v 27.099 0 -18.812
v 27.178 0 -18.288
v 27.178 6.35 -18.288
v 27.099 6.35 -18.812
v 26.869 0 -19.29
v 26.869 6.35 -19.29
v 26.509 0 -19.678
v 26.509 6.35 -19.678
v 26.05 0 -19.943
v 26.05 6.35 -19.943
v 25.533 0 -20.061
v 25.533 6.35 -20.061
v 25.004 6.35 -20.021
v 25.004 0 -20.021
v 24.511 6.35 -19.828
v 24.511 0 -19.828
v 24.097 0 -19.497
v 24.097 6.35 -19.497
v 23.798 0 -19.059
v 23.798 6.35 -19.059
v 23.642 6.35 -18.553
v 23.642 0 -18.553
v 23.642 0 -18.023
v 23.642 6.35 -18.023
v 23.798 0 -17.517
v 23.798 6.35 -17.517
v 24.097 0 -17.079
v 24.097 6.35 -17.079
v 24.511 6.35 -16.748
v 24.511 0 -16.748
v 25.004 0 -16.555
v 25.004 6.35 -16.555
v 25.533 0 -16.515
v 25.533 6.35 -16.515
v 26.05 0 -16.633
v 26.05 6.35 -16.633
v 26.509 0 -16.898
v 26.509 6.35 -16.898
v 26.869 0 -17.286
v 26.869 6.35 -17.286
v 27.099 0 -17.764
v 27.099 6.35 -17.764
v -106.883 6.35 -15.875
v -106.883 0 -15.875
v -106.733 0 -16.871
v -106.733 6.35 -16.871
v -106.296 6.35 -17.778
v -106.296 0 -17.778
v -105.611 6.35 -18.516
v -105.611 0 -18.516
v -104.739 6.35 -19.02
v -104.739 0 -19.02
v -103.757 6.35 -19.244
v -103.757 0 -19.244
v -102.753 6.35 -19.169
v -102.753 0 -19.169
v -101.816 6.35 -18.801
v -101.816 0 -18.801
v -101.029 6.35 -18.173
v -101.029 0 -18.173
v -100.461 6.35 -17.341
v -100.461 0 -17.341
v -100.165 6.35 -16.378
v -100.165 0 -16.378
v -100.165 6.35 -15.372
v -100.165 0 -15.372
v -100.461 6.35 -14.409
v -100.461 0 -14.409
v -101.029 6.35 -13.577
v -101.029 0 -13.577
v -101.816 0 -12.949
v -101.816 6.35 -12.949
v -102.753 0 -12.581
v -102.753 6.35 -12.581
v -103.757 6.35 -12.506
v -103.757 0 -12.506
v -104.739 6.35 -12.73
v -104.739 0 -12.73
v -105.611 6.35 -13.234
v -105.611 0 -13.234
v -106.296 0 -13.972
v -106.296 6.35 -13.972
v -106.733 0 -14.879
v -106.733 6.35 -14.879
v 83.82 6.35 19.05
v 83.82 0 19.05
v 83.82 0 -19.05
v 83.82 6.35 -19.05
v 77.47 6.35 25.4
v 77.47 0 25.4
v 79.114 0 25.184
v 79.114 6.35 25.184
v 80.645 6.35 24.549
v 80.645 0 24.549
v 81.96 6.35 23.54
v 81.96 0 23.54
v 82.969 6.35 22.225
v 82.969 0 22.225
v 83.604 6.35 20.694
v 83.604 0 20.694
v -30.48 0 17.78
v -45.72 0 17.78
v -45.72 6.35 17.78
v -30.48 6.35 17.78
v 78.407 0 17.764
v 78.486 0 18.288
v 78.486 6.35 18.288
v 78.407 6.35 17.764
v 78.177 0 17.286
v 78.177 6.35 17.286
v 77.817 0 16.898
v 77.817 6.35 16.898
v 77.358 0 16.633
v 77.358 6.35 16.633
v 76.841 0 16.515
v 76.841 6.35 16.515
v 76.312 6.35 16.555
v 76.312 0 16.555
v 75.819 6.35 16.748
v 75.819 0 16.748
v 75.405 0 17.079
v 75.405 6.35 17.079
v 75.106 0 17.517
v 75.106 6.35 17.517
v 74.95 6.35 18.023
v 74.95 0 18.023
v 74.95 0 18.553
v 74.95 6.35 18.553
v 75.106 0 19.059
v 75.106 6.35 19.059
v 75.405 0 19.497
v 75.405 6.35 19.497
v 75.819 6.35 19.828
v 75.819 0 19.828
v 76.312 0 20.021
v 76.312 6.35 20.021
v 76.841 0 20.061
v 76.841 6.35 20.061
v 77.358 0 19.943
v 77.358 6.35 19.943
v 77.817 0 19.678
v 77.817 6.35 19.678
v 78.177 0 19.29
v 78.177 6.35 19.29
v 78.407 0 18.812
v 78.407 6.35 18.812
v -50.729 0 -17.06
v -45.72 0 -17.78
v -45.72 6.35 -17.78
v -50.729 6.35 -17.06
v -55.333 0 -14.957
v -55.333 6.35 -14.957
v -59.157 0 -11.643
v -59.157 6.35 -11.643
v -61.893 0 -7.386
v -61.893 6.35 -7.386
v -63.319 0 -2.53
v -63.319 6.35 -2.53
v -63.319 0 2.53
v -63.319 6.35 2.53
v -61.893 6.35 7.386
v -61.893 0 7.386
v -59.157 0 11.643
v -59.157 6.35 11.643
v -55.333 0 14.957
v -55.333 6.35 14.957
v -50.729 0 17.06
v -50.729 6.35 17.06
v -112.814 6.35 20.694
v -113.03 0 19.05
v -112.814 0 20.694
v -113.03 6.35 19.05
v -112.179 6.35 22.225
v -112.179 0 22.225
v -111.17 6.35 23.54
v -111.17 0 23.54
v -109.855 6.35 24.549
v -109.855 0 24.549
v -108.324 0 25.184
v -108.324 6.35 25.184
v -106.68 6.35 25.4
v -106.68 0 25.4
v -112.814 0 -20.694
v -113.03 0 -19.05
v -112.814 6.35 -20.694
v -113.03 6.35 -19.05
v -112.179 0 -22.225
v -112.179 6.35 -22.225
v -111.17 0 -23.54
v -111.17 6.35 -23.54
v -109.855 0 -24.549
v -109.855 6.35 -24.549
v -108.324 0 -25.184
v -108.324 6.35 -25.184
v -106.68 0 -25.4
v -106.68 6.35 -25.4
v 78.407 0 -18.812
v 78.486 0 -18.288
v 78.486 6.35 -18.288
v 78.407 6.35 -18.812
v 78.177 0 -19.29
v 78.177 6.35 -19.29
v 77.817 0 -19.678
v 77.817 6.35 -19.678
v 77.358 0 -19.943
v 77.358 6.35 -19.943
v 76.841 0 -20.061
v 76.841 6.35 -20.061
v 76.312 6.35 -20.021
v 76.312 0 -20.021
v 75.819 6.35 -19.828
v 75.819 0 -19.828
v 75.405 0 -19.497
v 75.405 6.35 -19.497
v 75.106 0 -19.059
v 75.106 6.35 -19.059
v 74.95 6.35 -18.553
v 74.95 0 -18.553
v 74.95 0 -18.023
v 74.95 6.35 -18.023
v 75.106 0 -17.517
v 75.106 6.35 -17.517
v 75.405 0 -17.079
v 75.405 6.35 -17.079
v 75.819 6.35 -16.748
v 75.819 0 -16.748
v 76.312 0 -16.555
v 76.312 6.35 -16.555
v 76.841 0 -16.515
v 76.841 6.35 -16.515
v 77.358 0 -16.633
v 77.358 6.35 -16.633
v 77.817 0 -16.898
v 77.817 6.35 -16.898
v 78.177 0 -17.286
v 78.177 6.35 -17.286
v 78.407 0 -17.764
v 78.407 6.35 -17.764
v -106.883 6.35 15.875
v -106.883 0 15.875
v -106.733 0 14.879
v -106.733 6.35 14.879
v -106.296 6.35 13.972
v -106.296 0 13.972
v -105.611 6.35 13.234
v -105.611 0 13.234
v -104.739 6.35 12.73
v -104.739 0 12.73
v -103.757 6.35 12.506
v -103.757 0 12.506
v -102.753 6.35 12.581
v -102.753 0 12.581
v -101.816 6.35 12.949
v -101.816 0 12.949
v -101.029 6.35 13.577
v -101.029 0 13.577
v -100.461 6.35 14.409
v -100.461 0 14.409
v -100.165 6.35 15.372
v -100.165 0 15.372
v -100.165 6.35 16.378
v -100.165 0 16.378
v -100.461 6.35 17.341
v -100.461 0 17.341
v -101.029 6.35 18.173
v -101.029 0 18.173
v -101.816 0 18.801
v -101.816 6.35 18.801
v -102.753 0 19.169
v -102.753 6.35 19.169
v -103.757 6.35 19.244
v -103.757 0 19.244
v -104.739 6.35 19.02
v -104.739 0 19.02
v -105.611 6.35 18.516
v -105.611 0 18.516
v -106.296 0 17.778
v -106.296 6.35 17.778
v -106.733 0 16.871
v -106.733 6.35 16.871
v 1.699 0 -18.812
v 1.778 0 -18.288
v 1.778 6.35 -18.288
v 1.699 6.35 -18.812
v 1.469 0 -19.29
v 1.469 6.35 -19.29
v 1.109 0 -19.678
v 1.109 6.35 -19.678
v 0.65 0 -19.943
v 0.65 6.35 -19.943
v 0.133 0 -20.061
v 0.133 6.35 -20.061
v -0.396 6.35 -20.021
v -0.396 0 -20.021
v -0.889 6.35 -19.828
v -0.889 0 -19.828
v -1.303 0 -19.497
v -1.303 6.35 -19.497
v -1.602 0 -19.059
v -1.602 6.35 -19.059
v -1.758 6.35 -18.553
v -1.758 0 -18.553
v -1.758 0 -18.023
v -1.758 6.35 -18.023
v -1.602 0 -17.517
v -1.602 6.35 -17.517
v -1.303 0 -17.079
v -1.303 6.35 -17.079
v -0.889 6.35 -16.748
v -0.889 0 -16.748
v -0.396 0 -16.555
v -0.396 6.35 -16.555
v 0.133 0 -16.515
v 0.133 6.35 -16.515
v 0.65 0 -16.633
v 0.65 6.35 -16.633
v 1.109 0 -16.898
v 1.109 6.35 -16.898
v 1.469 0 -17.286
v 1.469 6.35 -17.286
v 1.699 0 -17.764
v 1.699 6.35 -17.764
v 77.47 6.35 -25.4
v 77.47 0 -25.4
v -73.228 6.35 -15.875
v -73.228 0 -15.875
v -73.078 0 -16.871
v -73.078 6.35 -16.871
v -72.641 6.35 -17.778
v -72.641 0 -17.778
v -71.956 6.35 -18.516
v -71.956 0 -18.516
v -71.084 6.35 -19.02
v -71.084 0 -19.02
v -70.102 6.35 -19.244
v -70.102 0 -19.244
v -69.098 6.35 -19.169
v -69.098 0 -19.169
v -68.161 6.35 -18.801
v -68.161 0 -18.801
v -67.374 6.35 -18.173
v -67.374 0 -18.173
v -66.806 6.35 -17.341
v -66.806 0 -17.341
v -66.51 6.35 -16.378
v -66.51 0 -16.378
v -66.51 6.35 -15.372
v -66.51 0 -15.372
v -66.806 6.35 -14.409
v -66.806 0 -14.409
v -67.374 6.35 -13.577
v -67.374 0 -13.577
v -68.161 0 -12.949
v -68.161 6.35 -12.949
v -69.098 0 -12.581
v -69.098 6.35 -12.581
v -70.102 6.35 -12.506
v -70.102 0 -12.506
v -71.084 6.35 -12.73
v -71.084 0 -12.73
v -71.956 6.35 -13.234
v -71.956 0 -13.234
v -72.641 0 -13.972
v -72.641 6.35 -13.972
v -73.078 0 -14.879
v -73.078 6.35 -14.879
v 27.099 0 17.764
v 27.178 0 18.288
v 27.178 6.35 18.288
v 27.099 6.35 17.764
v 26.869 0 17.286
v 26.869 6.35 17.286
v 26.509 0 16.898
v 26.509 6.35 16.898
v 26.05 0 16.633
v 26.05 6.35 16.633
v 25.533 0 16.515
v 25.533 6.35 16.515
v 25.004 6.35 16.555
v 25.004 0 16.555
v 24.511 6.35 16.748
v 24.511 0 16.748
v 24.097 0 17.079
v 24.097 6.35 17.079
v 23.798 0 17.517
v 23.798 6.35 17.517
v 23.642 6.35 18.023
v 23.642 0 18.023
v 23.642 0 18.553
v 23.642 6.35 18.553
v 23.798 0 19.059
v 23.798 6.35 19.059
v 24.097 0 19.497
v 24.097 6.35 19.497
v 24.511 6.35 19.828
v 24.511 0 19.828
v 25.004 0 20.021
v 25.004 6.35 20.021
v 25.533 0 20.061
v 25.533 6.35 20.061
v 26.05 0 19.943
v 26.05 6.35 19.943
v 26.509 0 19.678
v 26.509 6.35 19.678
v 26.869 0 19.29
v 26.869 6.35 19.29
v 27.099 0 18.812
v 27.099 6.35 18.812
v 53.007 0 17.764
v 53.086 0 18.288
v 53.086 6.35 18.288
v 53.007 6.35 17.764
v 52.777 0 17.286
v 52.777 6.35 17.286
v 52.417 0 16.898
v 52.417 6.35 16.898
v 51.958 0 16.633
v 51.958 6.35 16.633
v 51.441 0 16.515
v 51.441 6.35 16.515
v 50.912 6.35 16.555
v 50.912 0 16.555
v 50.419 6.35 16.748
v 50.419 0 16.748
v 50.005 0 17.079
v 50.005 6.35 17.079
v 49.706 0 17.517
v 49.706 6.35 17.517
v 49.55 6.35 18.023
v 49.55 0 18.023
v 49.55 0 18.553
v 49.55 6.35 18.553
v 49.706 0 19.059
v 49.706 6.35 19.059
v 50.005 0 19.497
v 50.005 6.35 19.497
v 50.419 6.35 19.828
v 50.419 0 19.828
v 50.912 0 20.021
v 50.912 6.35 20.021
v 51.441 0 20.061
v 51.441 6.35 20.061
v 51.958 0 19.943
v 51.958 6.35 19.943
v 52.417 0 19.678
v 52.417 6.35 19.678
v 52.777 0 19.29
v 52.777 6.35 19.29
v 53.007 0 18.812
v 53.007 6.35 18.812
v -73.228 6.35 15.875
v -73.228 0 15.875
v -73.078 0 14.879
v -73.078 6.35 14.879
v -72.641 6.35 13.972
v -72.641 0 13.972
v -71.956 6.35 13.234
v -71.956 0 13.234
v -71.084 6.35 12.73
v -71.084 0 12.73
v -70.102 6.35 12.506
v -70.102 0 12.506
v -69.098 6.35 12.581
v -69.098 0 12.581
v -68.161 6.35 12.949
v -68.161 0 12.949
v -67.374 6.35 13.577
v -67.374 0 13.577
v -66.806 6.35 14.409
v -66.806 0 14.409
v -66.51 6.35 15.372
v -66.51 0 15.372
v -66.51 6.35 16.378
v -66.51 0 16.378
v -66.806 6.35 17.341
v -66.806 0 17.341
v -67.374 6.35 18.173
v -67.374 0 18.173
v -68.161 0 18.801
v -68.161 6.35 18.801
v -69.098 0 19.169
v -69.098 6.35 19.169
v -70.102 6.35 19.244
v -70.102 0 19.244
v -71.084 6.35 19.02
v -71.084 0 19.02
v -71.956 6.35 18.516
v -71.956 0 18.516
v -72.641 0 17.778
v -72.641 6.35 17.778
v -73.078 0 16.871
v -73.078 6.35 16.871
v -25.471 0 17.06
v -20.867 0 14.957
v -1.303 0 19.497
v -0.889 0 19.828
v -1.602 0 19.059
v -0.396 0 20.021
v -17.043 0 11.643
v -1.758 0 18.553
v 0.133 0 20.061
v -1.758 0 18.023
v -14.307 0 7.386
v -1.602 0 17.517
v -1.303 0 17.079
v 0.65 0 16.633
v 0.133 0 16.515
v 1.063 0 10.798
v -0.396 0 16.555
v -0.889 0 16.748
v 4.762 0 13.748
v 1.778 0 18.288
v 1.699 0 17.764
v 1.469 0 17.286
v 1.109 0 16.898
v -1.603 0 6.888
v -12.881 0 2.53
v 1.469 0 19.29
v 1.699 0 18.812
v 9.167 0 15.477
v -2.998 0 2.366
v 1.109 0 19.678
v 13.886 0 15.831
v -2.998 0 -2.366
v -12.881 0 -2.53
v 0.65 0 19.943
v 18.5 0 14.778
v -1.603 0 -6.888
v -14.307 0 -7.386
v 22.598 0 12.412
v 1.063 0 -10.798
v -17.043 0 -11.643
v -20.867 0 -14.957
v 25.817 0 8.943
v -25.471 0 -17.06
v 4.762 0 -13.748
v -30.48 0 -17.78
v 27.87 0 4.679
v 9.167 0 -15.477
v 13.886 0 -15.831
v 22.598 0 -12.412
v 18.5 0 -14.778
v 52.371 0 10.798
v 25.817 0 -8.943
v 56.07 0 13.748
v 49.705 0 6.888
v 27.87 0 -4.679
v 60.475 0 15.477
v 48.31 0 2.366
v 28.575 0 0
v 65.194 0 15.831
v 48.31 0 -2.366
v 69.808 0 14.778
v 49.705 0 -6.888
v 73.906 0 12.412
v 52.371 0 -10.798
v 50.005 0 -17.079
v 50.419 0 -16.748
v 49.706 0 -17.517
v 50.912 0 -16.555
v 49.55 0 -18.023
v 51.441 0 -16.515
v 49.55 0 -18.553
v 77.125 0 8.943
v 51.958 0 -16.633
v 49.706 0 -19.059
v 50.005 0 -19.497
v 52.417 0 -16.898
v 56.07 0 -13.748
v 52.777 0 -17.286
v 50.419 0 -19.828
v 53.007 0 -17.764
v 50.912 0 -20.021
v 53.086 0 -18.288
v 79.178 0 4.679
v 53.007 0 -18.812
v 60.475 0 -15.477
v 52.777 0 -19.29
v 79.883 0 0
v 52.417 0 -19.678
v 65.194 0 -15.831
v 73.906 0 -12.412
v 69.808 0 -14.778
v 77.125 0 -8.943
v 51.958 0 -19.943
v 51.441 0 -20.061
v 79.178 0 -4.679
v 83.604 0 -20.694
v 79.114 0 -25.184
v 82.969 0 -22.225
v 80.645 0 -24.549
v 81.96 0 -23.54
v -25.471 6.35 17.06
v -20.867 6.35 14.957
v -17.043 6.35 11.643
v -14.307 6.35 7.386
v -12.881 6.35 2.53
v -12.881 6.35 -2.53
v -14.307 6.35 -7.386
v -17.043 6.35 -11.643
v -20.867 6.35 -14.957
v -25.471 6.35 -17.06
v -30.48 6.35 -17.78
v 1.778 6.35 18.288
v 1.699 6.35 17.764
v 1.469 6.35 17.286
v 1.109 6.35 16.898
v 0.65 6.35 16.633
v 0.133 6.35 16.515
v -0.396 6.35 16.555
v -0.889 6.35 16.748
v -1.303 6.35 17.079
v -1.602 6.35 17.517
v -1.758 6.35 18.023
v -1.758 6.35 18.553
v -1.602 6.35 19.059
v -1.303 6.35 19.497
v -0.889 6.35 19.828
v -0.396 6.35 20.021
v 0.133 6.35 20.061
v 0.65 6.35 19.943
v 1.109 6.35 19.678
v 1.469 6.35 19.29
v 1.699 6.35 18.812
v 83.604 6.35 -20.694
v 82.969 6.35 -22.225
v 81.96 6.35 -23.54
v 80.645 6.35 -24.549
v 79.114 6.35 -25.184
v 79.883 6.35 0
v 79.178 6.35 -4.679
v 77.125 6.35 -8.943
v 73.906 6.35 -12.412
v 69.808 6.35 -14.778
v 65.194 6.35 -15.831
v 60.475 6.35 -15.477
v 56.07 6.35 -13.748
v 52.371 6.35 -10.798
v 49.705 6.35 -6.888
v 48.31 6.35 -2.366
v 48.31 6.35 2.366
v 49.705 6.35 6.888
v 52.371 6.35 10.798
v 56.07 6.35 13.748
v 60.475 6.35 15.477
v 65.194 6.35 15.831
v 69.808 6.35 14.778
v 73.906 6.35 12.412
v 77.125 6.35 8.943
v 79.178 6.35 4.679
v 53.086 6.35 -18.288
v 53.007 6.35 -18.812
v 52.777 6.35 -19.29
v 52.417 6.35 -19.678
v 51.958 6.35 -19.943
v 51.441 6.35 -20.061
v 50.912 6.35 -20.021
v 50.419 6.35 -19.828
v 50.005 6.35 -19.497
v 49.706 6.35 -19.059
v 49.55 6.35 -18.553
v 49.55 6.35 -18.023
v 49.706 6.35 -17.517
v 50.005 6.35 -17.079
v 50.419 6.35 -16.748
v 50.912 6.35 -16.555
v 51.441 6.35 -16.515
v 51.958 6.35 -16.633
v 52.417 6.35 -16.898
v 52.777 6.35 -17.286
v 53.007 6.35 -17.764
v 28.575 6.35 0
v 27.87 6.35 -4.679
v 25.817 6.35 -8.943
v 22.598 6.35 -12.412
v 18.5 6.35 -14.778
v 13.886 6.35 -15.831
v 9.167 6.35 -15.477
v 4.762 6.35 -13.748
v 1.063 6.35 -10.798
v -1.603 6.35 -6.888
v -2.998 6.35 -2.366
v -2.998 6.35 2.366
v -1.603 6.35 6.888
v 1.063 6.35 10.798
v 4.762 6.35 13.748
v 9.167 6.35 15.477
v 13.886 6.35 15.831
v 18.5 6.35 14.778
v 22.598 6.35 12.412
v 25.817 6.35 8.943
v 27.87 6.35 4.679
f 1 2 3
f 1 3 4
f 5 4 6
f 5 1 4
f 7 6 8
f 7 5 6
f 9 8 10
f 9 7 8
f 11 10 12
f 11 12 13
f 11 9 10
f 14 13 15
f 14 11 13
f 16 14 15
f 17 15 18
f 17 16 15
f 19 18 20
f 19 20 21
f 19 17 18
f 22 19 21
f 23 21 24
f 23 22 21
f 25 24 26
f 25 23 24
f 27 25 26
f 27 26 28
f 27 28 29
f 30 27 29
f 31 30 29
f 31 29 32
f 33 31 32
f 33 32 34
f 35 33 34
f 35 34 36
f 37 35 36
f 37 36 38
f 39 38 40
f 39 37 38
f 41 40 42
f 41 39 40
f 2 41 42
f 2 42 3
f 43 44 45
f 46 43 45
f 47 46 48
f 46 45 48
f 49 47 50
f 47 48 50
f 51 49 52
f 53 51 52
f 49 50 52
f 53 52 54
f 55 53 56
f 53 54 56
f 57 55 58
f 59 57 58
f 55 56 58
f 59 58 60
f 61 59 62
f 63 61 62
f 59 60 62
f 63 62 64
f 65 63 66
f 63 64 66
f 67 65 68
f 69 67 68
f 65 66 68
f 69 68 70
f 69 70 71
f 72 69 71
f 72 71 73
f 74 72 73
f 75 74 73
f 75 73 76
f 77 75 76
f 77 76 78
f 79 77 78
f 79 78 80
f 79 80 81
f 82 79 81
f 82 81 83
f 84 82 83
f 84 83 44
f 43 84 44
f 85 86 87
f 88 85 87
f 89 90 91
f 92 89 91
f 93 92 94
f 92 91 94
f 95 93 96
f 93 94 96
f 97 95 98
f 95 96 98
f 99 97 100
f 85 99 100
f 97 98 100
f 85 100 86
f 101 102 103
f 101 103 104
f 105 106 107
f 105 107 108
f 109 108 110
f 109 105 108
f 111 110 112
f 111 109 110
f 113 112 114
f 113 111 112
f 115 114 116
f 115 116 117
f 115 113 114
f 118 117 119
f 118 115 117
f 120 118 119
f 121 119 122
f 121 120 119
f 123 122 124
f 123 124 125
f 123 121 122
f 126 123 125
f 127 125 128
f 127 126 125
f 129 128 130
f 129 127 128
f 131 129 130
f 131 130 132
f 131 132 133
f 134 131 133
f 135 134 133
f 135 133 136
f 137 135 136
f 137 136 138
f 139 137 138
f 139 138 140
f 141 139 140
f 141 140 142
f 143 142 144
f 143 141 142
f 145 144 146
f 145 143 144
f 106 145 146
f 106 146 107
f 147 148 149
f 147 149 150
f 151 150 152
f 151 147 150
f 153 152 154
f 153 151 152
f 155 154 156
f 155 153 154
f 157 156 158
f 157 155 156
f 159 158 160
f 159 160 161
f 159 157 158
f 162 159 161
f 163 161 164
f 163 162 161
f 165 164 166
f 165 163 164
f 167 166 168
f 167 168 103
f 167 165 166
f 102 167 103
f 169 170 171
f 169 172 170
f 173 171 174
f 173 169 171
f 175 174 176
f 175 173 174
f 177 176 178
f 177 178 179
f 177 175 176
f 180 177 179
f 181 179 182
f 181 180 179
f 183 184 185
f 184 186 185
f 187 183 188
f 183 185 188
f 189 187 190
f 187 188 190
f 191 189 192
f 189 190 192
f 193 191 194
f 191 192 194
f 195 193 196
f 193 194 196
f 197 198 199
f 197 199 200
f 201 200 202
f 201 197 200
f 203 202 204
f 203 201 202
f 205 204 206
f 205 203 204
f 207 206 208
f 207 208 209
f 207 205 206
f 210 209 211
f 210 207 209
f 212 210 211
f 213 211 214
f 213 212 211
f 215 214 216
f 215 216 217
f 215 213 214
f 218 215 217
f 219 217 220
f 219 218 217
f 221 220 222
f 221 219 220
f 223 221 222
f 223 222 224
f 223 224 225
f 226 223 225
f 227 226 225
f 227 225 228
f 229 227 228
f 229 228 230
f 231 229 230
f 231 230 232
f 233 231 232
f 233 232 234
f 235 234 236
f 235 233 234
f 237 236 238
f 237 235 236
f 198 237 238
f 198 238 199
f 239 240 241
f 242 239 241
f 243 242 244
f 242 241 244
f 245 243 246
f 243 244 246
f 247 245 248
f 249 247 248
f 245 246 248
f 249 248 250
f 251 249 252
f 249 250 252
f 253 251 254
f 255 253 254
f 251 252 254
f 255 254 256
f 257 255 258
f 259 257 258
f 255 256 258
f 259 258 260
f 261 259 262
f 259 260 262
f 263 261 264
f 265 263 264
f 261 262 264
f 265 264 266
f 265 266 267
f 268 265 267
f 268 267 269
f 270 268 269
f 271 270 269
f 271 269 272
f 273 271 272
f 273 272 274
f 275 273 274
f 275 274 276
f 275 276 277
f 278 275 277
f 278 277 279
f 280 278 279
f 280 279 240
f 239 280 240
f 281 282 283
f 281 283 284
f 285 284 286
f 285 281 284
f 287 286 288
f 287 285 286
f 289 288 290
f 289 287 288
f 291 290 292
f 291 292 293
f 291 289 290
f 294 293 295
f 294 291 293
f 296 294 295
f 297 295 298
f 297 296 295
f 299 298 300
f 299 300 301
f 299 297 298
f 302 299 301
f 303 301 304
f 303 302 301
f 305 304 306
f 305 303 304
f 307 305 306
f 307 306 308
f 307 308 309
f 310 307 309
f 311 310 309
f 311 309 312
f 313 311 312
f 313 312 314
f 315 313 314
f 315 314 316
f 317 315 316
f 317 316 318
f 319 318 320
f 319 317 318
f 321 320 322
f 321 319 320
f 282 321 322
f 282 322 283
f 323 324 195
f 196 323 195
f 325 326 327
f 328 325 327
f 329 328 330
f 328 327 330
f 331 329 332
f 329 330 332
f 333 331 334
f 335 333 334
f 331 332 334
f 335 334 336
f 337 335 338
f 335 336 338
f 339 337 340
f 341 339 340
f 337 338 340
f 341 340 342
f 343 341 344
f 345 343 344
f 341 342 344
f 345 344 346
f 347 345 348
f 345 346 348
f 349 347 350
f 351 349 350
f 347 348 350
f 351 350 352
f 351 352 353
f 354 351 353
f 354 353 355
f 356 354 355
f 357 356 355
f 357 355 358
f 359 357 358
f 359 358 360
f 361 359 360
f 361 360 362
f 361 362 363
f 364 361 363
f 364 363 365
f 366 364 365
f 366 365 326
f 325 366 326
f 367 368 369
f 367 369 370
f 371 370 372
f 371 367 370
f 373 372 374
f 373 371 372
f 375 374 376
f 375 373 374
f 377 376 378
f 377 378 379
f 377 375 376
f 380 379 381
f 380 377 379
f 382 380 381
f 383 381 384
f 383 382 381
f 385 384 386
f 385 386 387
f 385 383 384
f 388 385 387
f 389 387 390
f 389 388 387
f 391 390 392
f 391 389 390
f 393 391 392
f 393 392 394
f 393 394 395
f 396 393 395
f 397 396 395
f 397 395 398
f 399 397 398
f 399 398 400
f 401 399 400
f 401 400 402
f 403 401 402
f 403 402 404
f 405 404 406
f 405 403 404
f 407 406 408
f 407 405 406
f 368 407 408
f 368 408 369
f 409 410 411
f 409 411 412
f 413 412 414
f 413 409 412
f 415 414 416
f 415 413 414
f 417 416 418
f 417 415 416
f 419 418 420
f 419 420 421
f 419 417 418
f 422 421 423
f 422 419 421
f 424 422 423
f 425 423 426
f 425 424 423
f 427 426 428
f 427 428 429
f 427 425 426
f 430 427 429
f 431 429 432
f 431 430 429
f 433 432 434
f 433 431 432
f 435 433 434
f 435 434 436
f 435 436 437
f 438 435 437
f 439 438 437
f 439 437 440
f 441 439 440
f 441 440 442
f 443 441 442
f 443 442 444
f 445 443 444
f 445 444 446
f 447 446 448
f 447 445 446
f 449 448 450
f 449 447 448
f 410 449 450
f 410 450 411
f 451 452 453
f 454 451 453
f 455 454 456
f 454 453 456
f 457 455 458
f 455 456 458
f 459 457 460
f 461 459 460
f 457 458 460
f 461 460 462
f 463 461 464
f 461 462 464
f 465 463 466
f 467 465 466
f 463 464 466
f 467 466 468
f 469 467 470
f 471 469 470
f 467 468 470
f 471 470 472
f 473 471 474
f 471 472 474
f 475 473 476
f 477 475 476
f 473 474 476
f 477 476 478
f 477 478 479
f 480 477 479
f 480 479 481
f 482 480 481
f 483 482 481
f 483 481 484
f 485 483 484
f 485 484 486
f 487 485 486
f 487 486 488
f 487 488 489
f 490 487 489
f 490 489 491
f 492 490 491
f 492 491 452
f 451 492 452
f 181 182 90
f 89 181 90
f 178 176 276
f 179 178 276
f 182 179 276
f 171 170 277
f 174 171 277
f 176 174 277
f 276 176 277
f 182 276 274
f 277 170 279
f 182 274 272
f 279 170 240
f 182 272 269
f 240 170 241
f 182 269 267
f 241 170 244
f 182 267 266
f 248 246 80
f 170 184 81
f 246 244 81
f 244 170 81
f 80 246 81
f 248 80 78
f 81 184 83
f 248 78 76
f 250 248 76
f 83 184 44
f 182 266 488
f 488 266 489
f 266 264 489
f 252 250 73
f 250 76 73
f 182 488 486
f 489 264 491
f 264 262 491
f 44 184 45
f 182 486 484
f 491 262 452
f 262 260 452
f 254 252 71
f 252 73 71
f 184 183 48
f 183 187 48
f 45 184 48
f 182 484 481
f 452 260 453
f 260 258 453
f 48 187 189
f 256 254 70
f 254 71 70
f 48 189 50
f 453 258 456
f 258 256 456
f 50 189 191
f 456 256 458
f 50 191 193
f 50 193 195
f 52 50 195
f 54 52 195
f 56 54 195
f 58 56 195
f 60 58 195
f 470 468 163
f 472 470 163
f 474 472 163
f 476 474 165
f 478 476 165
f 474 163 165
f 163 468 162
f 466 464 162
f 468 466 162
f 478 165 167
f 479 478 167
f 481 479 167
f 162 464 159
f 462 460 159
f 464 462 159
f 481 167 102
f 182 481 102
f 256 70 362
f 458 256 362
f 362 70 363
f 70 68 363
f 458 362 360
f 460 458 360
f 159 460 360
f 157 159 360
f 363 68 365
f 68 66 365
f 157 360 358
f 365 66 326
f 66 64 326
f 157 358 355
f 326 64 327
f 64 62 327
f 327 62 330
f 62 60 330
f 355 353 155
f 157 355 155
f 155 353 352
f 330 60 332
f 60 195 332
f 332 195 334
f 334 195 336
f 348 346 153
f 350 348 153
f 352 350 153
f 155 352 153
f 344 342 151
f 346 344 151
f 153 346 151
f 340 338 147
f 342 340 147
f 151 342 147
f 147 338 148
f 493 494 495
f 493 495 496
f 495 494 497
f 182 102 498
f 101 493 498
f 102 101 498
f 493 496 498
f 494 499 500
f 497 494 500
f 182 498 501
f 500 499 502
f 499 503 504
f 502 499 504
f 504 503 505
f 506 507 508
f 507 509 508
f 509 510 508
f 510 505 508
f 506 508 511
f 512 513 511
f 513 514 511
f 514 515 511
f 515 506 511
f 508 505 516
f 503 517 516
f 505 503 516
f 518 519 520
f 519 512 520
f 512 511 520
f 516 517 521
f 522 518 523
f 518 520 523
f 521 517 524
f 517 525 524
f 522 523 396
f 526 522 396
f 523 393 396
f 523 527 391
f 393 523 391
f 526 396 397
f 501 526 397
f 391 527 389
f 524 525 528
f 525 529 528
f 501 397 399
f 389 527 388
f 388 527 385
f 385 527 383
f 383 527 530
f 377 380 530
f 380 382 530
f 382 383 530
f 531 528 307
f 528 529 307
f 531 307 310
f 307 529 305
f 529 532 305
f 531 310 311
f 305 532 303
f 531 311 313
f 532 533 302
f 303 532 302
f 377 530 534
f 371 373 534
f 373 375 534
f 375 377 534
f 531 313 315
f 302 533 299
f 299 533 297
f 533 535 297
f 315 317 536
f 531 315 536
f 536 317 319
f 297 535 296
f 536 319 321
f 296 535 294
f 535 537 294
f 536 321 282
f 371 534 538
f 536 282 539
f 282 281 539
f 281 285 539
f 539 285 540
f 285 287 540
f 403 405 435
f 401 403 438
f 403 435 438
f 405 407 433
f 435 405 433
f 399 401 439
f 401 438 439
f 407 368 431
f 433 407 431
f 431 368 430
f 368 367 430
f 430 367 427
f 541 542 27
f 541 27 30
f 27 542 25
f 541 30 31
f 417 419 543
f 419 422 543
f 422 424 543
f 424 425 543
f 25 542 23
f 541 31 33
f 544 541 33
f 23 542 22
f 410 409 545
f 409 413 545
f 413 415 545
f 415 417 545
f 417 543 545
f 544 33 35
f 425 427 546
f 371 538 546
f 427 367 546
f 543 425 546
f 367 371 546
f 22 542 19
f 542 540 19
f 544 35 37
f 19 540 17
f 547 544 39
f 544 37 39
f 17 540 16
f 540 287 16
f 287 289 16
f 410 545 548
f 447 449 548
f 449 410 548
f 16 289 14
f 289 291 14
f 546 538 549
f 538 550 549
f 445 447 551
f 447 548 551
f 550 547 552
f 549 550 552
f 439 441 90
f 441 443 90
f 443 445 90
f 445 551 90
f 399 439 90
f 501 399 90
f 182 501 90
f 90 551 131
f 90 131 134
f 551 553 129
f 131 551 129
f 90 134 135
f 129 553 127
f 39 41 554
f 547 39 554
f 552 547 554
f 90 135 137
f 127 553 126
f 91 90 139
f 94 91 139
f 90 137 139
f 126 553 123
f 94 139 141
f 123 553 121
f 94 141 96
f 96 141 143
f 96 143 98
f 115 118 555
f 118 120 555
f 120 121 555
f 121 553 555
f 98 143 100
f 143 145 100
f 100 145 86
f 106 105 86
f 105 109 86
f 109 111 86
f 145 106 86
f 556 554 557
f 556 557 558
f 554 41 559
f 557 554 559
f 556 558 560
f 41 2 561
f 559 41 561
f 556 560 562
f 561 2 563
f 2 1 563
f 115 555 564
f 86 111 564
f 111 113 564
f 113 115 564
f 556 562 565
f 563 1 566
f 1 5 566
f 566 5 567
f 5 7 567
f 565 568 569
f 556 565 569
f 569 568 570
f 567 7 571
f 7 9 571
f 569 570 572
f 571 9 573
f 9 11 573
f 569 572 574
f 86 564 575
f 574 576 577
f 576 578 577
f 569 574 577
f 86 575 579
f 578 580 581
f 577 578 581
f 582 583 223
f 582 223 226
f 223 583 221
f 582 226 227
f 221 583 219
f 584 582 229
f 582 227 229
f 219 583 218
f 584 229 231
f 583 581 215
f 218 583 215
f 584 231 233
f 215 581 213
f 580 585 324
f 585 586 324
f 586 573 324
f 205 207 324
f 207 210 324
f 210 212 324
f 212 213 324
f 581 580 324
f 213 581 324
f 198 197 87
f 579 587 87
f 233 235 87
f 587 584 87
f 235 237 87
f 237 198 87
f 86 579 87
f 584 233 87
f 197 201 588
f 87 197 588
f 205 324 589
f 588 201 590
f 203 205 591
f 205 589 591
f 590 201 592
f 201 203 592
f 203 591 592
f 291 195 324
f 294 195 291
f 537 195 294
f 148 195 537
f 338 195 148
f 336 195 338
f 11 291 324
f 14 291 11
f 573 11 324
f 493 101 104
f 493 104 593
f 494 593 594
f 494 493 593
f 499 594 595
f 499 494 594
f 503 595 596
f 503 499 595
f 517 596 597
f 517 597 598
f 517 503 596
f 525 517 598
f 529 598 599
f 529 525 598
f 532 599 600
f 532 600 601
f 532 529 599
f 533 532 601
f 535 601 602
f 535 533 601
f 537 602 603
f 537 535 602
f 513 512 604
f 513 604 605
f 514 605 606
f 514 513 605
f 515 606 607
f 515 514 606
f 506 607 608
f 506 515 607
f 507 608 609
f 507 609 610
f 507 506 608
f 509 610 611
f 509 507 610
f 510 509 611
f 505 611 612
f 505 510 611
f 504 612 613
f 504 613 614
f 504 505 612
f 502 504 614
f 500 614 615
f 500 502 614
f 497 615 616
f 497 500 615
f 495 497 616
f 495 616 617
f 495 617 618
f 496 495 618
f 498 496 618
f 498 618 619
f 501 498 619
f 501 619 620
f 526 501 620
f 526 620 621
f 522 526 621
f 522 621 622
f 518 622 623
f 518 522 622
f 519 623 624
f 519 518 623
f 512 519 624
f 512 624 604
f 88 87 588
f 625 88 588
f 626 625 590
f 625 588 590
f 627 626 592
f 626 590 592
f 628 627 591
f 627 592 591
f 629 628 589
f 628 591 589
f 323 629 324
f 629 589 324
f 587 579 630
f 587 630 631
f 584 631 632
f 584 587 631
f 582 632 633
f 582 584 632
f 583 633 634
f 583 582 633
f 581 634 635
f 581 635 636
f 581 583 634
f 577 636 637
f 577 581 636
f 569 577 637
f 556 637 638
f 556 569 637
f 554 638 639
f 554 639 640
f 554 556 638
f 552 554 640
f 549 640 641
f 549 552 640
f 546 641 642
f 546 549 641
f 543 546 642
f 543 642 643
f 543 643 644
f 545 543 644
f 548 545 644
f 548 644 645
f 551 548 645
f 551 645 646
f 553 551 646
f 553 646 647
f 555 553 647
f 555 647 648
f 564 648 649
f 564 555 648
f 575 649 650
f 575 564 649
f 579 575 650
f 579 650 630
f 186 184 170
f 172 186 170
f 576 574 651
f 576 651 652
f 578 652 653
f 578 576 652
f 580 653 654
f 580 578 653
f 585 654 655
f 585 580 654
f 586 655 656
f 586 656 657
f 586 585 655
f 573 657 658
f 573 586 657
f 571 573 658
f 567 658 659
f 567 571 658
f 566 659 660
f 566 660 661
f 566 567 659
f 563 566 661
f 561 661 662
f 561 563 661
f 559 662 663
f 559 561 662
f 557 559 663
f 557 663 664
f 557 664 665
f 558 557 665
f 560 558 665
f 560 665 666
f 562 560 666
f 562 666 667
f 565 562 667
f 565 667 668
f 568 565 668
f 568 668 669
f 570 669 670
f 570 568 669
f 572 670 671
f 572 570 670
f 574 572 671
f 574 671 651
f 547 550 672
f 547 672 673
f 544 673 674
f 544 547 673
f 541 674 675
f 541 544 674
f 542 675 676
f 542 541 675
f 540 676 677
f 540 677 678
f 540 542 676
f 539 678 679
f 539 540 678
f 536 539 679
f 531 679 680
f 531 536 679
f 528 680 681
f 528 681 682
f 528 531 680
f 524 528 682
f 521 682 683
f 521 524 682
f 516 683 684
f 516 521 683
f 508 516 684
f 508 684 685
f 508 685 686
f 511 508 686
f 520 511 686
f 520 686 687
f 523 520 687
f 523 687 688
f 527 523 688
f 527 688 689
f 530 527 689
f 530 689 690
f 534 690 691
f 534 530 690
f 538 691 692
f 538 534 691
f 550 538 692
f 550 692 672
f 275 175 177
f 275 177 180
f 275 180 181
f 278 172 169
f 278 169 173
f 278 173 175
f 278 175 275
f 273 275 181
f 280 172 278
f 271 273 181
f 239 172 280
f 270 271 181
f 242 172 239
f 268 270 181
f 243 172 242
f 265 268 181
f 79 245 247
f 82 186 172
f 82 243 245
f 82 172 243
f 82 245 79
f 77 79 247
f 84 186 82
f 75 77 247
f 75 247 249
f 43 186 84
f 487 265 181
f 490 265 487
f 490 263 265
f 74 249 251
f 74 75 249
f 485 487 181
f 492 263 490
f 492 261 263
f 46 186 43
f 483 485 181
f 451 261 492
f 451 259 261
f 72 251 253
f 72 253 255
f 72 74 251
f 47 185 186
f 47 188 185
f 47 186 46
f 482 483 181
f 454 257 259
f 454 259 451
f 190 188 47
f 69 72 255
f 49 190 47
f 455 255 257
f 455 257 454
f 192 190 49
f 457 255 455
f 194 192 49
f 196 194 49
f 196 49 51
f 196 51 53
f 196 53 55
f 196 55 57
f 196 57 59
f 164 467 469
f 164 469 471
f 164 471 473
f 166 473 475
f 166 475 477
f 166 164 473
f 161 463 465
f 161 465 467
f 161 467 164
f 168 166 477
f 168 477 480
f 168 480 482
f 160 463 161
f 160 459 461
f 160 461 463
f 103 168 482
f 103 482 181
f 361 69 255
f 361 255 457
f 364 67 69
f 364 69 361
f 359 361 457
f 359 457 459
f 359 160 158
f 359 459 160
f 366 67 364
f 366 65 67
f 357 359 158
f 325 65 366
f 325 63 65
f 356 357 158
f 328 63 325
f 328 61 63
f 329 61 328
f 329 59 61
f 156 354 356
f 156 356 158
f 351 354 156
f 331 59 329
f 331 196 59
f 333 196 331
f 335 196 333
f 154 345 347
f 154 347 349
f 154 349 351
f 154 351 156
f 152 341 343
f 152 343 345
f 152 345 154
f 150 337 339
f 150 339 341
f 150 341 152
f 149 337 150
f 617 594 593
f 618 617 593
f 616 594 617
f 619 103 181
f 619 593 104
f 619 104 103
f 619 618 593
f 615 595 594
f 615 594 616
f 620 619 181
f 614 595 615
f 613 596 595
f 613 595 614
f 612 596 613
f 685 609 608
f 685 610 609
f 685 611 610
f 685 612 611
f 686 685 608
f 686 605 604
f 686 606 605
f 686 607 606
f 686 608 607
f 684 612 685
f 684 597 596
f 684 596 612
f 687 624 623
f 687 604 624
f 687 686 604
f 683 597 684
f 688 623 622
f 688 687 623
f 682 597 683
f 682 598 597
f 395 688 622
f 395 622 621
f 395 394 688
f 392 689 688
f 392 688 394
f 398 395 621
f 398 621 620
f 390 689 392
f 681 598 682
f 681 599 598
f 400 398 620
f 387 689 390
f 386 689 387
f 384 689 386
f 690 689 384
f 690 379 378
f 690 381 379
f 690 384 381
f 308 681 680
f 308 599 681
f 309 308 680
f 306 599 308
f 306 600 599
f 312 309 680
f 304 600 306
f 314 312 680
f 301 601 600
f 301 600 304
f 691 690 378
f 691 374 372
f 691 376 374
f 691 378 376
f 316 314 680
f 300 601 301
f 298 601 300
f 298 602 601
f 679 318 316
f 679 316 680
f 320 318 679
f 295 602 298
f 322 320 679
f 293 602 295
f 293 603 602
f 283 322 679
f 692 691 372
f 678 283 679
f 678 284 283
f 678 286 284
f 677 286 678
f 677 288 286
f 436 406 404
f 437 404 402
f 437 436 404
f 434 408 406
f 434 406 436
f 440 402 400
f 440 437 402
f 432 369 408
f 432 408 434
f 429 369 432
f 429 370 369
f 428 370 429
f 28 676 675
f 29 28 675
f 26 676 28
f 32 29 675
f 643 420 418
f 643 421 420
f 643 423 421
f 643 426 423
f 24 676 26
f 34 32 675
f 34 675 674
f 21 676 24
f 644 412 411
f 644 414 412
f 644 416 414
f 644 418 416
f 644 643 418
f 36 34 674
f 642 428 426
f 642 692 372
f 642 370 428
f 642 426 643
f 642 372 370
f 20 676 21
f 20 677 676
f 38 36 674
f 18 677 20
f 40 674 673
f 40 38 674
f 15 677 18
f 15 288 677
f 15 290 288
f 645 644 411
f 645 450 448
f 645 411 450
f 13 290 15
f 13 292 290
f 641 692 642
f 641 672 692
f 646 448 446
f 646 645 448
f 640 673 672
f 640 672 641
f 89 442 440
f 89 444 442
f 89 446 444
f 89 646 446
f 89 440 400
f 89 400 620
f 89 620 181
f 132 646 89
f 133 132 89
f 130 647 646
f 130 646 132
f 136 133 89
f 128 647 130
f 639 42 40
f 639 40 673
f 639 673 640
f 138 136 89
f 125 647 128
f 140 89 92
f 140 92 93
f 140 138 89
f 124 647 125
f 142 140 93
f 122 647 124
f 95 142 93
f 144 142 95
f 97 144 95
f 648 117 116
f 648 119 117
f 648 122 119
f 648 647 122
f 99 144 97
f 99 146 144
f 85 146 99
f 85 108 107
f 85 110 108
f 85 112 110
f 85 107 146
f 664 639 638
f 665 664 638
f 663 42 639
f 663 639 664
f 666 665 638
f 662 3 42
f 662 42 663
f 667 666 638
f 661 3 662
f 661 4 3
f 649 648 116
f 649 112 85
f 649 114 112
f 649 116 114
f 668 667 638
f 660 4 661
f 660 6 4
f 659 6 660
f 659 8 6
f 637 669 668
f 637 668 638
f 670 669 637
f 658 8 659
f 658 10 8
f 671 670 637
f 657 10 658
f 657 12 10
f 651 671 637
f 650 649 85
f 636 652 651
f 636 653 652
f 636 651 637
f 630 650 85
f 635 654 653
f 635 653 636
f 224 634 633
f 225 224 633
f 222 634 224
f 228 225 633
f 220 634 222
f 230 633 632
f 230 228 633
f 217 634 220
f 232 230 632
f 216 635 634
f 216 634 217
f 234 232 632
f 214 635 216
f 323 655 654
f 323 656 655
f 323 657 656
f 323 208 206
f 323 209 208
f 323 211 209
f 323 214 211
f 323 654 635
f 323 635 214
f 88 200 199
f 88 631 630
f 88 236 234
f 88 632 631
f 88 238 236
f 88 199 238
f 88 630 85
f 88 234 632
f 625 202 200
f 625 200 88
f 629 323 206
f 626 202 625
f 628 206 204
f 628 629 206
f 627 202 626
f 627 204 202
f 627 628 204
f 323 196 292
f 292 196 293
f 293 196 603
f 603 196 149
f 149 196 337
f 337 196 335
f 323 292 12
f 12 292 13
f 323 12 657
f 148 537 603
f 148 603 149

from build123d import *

# Parameters (mm, degrees)
SKETCH1_R                   = 15.875
SKETCH1_R_2                 = 1.778
BOSS_EXTRUDE1_DEPTH         = 6.35
F_1_4_CLEARANCE_HOLE2_D     = 6.7564
F_1_4_CLEARANCE_HOLE2_DEPTH = 6.35
FILLET1_R                   = 6.35


with BuildPart() as part:
    # Sketch1 → Boss-Extrude1 (new body)
    with BuildSketch(Plane(origin=(0, 0, 0), x_dir=(1, 0, 0), z_dir=(0, 1, 0))):
        with BuildLine():
            Line((-113.03, 25.4), (-113.03, -25.4))
            Line((-113.03, -25.4), (77.47, -25.4))
            ThreePointArc((77.47, -25.4), (81.960128061, -23.540128061), (83.82, -19.05))
            Line((83.82, -19.05), (83.82, 19.05))
            ThreePointArc((83.82, 19.05), (81.960128061, 23.540128061), (77.47, 25.4))
            Line((77.47, 25.4), (-113.03, 25.4))
        make_face()
        with Locations((12.7, 0)):
            Circle(SKETCH1_R, mode=Mode.SUBTRACT)
        with Locations((64.008, 0)):
            Circle(SKETCH1_R, mode=Mode.SUBTRACT)
        with Locations((0, 18.288)):
            Circle(SKETCH1_R_2, mode=Mode.SUBTRACT)
        with Locations((25.4, 18.288)):
            Circle(SKETCH1_R_2, mode=Mode.SUBTRACT)
        with Locations((51.308, 18.288)):
            Circle(SKETCH1_R_2, mode=Mode.SUBTRACT)
        with Locations((76.708, 18.288)):
            Circle(SKETCH1_R_2, mode=Mode.SUBTRACT)
        with Locations((0, -18.288)):
            Circle(SKETCH1_R_2, mode=Mode.SUBTRACT)
        with Locations((25.4, -18.288)):
            Circle(SKETCH1_R_2, mode=Mode.SUBTRACT)
        with Locations((51.308, -18.288)):
            Circle(SKETCH1_R_2, mode=Mode.SUBTRACT)
        with Locations((76.708, -18.288)):
            Circle(SKETCH1_R_2, mode=Mode.SUBTRACT)
        with BuildLine():
            Line((-30.48, 17.78), (-45.72, 17.78))
            ThreePointArc((-45.72, 17.78), (-63.5, 0), (-45.72, -17.78))
            Line((-45.72, -17.78), (-30.48, -17.78))
            ThreePointArc((-30.48, -17.78), (-12.7, 0), (-30.48, 17.78))
        make_face(mode=Mode.SUBTRACT)
    extrude(amount=BOSS_EXTRUDE1_DEPTH)

    # 1/4 Clearance Hole2
    with Locations(Plane(origin=(0, 6.35, 0), x_dir=(1, 0, 0), z_dir=(0, 1, 0))):
        with Locations((-103.505, 15.875), (-69.85, 15.875), (-69.85, -15.875), (-103.505, -15.875)):
            Hole(F_1_4_CLEARANCE_HOLE2_D / 2, depth=F_1_4_CLEARANCE_HOLE2_DEPTH)

    # Fillet1
    fillet1_edges = [part.edges().sort_by_distance(p)[0] for p in [
        (-113.03, 3.175, 25.4),
        (-113.03, 3.175, -25.4),
    ]]
    fillet(fillet1_edges, radius=FILLET1_R)


solid = part.part
